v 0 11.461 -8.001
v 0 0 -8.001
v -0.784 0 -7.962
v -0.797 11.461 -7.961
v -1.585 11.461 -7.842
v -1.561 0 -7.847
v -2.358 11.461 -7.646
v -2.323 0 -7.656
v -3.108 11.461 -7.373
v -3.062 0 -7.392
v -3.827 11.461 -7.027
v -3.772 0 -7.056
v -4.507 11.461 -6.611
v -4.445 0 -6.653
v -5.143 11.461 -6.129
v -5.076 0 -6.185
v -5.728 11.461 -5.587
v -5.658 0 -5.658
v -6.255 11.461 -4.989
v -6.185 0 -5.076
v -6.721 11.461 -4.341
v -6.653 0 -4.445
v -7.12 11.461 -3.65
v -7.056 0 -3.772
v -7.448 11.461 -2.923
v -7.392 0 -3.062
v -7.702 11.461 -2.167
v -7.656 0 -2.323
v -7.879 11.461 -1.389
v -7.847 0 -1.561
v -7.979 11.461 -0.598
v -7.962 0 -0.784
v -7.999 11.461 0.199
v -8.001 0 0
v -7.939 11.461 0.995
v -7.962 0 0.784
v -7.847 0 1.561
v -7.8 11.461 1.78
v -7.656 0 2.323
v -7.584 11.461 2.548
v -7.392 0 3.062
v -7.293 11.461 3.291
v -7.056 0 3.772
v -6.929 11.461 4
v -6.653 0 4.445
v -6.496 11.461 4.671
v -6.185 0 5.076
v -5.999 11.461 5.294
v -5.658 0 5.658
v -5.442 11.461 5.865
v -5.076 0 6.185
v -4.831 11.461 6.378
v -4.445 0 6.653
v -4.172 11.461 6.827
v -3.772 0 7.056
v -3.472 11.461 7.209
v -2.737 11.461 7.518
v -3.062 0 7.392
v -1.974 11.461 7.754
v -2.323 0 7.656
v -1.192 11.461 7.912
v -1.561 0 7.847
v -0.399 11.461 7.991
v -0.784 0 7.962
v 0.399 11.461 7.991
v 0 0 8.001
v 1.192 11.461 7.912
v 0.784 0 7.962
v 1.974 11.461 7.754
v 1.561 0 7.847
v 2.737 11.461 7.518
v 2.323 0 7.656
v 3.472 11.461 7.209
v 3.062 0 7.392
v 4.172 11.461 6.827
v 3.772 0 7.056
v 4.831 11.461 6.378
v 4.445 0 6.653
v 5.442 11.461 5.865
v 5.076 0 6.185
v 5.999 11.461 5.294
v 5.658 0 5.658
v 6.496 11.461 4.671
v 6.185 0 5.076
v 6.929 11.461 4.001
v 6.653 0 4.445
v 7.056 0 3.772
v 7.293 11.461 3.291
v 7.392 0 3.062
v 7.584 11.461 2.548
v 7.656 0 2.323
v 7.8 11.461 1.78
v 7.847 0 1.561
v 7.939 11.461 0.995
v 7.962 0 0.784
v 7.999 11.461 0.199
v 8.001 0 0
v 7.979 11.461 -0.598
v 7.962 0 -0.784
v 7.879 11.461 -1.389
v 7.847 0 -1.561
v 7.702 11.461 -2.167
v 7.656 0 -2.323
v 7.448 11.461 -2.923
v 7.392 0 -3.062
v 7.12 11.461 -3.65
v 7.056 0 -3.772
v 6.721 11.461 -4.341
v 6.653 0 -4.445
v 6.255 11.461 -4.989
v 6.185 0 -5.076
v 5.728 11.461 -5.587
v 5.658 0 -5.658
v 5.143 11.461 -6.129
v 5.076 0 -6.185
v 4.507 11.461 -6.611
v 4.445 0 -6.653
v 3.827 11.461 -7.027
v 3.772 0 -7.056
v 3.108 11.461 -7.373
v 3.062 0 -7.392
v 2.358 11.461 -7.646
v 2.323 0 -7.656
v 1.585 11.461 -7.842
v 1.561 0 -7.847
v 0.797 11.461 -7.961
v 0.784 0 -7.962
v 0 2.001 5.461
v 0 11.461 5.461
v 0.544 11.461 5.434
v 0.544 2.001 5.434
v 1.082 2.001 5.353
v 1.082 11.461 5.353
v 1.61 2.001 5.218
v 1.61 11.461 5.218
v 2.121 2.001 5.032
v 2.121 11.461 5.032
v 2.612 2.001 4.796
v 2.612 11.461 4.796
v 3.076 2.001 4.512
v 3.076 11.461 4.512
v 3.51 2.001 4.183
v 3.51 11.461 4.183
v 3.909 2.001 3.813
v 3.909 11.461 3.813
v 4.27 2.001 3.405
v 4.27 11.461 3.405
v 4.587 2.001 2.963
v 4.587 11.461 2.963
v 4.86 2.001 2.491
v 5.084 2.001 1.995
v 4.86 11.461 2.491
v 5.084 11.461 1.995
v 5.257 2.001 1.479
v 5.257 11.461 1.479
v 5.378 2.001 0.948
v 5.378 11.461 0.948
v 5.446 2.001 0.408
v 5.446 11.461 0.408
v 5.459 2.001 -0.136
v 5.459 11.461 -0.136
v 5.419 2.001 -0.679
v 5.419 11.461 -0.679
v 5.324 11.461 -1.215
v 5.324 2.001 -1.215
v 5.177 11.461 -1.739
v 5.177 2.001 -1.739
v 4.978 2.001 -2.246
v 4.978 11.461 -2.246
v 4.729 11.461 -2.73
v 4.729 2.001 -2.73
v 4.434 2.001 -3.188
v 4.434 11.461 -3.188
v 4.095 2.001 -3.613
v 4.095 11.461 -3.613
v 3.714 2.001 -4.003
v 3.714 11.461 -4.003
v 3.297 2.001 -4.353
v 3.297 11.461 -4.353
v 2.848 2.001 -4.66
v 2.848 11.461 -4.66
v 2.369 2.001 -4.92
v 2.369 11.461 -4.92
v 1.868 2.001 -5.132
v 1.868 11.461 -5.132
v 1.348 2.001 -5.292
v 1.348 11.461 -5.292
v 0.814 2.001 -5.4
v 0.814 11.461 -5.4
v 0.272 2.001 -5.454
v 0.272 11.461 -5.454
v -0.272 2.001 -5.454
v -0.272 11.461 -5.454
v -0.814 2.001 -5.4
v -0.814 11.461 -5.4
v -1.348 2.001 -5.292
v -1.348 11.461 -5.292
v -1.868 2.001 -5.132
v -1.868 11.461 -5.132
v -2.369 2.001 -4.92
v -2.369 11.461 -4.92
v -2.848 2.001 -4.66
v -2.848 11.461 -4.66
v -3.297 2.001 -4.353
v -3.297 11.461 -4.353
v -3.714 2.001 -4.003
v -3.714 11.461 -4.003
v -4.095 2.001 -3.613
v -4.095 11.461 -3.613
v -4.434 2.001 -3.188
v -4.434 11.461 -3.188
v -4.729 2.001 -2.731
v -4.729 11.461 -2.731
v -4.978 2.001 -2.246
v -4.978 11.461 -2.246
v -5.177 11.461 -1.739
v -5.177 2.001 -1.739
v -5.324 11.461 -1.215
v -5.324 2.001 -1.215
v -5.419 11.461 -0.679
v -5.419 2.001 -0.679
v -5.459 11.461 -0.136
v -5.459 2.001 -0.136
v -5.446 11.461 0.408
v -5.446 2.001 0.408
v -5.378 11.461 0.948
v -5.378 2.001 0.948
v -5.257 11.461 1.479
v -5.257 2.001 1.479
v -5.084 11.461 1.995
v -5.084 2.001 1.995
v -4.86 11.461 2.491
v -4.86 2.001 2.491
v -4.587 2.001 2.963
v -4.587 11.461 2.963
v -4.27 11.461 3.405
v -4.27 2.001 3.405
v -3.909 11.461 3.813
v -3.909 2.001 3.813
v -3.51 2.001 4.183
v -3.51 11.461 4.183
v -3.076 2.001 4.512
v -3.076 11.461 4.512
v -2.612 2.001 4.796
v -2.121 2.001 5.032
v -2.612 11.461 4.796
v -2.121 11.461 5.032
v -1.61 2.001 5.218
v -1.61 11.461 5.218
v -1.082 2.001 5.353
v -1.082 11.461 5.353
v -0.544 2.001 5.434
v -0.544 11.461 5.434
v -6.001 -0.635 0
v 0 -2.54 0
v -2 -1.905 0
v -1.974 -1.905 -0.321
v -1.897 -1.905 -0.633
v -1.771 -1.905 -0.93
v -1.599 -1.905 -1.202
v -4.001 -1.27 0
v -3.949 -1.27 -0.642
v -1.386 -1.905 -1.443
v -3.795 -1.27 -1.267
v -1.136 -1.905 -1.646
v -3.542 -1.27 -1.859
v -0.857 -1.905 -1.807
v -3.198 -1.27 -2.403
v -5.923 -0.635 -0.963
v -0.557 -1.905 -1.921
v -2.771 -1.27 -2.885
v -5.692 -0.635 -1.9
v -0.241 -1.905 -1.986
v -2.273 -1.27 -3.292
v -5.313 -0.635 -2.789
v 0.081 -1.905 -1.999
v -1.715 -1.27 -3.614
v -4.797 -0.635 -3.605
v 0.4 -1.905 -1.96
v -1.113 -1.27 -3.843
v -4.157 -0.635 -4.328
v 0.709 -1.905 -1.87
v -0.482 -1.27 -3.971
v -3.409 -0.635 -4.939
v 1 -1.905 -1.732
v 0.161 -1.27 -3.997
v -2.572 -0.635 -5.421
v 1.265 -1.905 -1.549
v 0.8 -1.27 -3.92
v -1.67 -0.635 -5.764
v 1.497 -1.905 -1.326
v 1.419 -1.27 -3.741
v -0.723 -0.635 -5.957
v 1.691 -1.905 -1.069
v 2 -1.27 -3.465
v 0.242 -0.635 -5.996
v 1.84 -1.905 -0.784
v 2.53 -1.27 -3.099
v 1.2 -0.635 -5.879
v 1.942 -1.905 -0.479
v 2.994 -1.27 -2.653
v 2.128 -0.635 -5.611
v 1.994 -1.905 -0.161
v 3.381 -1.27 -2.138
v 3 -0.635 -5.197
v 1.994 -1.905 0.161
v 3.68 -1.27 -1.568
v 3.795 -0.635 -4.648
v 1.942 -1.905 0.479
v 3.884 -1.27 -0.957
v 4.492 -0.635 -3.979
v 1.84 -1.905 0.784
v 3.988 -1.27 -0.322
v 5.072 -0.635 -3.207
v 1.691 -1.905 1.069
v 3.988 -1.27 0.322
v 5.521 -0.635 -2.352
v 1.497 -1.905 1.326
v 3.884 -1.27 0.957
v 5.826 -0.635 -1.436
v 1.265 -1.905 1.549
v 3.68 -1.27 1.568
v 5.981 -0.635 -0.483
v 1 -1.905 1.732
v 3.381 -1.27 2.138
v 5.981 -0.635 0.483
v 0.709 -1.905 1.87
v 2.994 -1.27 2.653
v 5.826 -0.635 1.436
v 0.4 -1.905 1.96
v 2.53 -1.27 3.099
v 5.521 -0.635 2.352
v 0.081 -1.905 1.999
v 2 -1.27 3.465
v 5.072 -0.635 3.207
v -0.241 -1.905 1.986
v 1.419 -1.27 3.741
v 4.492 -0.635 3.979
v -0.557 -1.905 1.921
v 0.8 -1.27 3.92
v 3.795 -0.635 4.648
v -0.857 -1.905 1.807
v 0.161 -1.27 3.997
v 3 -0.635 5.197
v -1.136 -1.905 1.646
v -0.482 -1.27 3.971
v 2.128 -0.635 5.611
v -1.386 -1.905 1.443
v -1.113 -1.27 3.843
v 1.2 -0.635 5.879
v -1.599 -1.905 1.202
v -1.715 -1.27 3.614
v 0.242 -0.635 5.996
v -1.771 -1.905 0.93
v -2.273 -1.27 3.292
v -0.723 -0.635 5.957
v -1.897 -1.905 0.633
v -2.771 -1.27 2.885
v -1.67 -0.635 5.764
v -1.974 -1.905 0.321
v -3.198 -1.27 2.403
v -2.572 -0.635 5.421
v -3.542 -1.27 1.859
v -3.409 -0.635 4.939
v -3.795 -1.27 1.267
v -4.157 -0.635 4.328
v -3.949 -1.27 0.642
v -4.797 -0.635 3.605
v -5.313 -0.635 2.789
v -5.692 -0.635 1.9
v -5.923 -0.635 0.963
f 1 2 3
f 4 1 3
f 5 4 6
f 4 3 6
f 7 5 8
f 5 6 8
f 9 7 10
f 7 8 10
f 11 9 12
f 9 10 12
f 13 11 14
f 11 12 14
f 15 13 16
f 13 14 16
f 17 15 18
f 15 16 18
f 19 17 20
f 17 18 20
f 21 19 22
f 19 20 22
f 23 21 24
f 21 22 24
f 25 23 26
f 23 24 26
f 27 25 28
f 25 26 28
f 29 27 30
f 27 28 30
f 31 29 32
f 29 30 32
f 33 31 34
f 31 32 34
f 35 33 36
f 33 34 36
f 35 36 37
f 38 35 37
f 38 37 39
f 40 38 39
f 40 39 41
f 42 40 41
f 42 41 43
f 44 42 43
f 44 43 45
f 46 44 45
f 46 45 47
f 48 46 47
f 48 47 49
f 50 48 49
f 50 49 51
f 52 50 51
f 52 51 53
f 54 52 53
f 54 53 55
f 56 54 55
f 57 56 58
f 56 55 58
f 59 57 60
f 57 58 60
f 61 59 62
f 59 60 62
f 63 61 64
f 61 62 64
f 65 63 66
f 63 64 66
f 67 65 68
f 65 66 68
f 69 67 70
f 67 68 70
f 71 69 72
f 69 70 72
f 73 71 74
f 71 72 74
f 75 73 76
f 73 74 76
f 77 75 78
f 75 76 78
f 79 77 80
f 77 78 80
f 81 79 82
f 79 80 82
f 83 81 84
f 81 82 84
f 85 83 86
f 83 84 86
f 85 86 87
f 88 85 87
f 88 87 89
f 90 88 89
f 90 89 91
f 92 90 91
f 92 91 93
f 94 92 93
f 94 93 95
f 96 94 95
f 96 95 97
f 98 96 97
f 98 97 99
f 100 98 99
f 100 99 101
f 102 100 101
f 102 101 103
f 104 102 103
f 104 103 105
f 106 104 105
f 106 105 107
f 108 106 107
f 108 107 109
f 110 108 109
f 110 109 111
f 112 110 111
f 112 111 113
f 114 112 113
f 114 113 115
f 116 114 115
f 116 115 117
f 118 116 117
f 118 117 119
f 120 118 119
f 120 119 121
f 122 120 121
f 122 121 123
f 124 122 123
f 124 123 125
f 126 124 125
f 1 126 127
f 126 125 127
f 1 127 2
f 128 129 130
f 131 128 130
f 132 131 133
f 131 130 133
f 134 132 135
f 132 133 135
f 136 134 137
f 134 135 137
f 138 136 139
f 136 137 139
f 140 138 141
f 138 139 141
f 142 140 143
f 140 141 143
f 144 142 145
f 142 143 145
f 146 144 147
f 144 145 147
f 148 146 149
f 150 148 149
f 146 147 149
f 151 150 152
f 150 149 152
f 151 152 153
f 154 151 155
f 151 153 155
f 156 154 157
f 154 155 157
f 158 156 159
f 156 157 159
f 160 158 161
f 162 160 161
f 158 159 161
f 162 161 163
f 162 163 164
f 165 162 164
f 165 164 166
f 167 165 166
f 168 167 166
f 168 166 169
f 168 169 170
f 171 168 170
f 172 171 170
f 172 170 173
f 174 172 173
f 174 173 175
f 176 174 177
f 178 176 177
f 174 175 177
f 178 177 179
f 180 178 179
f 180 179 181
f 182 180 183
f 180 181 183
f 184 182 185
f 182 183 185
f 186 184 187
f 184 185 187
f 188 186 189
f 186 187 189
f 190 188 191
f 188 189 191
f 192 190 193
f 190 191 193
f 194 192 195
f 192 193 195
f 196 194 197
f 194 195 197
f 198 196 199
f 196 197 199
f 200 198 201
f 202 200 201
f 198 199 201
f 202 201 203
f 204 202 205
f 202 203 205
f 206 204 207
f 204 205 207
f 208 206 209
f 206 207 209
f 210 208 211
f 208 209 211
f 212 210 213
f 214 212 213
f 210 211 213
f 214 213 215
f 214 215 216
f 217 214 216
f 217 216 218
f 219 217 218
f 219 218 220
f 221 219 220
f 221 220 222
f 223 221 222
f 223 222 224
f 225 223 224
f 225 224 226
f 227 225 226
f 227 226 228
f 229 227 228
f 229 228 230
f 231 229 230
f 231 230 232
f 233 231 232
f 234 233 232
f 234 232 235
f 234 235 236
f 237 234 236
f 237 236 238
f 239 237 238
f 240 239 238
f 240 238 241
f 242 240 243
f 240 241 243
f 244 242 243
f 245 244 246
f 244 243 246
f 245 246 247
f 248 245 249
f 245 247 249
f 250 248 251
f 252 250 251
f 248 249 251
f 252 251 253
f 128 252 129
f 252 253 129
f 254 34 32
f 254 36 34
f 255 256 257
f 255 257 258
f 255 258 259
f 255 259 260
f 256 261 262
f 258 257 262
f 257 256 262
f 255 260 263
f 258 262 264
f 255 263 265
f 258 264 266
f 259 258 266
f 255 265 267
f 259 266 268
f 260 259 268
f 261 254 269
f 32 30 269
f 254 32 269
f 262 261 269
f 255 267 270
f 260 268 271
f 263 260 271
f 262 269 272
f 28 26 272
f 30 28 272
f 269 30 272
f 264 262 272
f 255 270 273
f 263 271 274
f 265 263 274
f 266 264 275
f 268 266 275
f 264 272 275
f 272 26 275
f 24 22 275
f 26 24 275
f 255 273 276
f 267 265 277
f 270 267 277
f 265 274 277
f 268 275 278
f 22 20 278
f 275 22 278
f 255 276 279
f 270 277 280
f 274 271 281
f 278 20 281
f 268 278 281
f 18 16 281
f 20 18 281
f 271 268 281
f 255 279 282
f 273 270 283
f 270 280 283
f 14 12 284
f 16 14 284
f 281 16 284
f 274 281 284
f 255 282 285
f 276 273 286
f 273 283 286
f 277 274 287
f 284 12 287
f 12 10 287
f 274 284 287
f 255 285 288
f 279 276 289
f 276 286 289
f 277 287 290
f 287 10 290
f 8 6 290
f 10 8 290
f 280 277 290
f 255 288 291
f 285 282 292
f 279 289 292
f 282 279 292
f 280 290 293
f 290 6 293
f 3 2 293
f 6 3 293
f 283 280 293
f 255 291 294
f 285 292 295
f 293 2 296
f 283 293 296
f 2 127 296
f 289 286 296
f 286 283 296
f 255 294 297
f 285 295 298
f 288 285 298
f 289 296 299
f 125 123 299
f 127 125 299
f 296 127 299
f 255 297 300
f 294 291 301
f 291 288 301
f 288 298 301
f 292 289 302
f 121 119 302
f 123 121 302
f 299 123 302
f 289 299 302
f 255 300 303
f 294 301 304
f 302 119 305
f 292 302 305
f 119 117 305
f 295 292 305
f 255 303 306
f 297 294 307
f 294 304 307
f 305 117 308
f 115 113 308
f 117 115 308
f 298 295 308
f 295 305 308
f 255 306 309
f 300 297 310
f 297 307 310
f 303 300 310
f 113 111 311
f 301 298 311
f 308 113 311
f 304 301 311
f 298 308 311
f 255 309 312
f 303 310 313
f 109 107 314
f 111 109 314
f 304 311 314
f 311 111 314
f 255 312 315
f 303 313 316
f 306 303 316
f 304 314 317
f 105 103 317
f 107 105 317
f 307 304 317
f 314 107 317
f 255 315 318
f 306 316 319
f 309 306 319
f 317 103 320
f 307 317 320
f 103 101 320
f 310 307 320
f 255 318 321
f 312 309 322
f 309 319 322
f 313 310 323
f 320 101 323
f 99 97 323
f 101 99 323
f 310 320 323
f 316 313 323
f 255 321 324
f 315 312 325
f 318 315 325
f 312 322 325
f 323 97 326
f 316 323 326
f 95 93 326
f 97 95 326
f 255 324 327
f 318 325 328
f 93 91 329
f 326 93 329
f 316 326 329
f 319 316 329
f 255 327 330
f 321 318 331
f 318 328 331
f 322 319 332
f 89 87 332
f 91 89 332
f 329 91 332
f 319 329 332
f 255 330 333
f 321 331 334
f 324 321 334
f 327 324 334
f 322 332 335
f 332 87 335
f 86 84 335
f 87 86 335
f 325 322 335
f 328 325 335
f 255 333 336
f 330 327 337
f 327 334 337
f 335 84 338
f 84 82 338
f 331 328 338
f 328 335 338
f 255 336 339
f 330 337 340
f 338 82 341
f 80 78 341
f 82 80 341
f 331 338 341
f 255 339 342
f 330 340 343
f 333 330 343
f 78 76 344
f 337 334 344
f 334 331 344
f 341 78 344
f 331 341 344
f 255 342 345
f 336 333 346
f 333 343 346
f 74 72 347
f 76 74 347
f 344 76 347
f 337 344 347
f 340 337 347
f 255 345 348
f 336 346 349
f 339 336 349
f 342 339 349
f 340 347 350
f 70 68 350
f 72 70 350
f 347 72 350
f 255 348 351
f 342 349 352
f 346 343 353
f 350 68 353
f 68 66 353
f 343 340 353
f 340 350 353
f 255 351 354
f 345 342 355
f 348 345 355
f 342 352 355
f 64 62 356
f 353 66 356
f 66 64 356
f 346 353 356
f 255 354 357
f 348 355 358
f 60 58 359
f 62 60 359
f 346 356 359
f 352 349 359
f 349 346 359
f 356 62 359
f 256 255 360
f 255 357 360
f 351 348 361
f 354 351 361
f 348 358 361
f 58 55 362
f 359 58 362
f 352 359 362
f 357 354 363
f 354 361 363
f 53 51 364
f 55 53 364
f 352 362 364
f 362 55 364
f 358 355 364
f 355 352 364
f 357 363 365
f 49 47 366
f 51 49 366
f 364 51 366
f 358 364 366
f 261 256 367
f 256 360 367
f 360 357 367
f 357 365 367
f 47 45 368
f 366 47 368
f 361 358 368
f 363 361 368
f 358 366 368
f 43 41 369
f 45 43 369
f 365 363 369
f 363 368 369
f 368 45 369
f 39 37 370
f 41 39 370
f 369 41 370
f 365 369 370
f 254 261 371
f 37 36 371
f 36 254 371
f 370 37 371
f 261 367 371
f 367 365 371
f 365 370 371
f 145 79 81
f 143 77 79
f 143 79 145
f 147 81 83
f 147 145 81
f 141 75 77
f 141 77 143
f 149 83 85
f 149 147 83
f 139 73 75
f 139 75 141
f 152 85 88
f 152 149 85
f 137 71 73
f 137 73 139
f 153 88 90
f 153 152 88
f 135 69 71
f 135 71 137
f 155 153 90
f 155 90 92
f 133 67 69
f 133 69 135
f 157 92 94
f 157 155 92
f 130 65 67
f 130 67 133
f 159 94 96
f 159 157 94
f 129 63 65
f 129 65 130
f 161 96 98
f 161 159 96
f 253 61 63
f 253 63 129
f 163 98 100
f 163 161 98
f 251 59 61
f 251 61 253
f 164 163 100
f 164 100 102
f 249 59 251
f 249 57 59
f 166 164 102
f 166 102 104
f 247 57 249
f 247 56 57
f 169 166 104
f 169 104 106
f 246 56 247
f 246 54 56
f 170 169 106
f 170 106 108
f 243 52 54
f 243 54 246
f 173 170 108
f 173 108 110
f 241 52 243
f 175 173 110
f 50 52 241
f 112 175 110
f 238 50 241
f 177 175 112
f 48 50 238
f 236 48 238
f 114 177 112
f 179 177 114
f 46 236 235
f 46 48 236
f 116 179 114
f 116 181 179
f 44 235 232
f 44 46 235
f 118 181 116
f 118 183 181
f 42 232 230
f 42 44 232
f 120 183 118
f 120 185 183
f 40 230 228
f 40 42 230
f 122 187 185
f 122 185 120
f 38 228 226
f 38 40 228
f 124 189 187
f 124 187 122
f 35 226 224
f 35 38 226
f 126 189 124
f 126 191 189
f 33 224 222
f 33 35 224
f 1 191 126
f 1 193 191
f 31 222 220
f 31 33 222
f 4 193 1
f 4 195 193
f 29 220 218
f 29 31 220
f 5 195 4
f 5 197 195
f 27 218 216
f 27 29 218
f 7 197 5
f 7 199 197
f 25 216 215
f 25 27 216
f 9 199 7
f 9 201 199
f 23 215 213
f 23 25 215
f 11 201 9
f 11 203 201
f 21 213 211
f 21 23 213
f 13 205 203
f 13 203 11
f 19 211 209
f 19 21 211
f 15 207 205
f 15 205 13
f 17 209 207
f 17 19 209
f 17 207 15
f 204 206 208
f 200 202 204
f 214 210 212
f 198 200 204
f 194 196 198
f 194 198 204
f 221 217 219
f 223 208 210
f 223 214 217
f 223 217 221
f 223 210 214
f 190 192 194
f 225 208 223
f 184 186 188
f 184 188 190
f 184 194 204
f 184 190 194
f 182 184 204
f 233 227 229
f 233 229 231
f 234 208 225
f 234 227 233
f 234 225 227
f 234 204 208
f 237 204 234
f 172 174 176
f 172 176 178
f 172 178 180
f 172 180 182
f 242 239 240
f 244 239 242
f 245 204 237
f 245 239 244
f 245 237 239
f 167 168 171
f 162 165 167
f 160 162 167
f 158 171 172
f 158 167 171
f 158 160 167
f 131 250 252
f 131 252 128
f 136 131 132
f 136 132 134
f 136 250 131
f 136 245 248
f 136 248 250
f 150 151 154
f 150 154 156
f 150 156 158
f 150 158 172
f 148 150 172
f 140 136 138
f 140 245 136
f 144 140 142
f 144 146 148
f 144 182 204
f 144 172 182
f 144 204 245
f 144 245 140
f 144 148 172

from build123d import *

# Parameters (mm, degrees)
SKETCH1_R           = 8.001
SKETCH1_R_2         = 5.461
BOSS_EXTRUDE1_DEPTH = 11.461
CUT_EXTRUDE1_START  = 11.461
SKETCH1_6_R         = 5.461
CUT_EXTRUDE1_DEPTH  = 9.46


with BuildPart() as part:
    # Sketch1 → Boss-Extrude1 (new body)
    # profile 1 of 2: a face of its own
    with BuildSketch(Plane(origin=(0, 0, 0), x_dir=(1, 0, 0), z_dir=(0, 1, 0))):
        with Locations(Location((0, 0, 0), (0, 0, 90))):
            Circle(SKETCH1_R)
        Circle(SKETCH1_R_2, mode=Mode.SUBTRACT)
    # profile 2 of 2: a face of its own
    with BuildSketch(Plane(origin=(0, 0, 0), x_dir=(1, 0, 0), z_dir=(0, 1, 0))):
        Circle(SKETCH1_R_2)
    extrude(amount=BOSS_EXTRUDE1_DEPTH)

    # Sketch2 → Revolve1 (revolve)
    with BuildSketch(Plane.XY, mode=Mode.PRIVATE) as revolve1_sk:
        Polygon((0, 0), (0, -2.54), (8.001, 0), align=None)
    revolve(revolve1_sk.sketch.rotate(Axis((0, 0, 0), (0, -1, 0)), 180), axis=Axis((0, 0, 0), (0, -1, 0)))

    # Sketch1<6> → Cut-Extrude1 (cut)
    with BuildSketch(Plane(origin=(0, 0, 0), x_dir=(1, 0, 0), z_dir=(0, 1, 0)).offset(CUT_EXTRUDE1_START)):
        with Locations(Location((0, 0, 0), (0, 0, 270))):
            Circle(SKETCH1_6_R)
    extrude(amount=-CUT_EXTRUDE1_DEPTH, mode=Mode.SUBTRACT)


solid = part.part
